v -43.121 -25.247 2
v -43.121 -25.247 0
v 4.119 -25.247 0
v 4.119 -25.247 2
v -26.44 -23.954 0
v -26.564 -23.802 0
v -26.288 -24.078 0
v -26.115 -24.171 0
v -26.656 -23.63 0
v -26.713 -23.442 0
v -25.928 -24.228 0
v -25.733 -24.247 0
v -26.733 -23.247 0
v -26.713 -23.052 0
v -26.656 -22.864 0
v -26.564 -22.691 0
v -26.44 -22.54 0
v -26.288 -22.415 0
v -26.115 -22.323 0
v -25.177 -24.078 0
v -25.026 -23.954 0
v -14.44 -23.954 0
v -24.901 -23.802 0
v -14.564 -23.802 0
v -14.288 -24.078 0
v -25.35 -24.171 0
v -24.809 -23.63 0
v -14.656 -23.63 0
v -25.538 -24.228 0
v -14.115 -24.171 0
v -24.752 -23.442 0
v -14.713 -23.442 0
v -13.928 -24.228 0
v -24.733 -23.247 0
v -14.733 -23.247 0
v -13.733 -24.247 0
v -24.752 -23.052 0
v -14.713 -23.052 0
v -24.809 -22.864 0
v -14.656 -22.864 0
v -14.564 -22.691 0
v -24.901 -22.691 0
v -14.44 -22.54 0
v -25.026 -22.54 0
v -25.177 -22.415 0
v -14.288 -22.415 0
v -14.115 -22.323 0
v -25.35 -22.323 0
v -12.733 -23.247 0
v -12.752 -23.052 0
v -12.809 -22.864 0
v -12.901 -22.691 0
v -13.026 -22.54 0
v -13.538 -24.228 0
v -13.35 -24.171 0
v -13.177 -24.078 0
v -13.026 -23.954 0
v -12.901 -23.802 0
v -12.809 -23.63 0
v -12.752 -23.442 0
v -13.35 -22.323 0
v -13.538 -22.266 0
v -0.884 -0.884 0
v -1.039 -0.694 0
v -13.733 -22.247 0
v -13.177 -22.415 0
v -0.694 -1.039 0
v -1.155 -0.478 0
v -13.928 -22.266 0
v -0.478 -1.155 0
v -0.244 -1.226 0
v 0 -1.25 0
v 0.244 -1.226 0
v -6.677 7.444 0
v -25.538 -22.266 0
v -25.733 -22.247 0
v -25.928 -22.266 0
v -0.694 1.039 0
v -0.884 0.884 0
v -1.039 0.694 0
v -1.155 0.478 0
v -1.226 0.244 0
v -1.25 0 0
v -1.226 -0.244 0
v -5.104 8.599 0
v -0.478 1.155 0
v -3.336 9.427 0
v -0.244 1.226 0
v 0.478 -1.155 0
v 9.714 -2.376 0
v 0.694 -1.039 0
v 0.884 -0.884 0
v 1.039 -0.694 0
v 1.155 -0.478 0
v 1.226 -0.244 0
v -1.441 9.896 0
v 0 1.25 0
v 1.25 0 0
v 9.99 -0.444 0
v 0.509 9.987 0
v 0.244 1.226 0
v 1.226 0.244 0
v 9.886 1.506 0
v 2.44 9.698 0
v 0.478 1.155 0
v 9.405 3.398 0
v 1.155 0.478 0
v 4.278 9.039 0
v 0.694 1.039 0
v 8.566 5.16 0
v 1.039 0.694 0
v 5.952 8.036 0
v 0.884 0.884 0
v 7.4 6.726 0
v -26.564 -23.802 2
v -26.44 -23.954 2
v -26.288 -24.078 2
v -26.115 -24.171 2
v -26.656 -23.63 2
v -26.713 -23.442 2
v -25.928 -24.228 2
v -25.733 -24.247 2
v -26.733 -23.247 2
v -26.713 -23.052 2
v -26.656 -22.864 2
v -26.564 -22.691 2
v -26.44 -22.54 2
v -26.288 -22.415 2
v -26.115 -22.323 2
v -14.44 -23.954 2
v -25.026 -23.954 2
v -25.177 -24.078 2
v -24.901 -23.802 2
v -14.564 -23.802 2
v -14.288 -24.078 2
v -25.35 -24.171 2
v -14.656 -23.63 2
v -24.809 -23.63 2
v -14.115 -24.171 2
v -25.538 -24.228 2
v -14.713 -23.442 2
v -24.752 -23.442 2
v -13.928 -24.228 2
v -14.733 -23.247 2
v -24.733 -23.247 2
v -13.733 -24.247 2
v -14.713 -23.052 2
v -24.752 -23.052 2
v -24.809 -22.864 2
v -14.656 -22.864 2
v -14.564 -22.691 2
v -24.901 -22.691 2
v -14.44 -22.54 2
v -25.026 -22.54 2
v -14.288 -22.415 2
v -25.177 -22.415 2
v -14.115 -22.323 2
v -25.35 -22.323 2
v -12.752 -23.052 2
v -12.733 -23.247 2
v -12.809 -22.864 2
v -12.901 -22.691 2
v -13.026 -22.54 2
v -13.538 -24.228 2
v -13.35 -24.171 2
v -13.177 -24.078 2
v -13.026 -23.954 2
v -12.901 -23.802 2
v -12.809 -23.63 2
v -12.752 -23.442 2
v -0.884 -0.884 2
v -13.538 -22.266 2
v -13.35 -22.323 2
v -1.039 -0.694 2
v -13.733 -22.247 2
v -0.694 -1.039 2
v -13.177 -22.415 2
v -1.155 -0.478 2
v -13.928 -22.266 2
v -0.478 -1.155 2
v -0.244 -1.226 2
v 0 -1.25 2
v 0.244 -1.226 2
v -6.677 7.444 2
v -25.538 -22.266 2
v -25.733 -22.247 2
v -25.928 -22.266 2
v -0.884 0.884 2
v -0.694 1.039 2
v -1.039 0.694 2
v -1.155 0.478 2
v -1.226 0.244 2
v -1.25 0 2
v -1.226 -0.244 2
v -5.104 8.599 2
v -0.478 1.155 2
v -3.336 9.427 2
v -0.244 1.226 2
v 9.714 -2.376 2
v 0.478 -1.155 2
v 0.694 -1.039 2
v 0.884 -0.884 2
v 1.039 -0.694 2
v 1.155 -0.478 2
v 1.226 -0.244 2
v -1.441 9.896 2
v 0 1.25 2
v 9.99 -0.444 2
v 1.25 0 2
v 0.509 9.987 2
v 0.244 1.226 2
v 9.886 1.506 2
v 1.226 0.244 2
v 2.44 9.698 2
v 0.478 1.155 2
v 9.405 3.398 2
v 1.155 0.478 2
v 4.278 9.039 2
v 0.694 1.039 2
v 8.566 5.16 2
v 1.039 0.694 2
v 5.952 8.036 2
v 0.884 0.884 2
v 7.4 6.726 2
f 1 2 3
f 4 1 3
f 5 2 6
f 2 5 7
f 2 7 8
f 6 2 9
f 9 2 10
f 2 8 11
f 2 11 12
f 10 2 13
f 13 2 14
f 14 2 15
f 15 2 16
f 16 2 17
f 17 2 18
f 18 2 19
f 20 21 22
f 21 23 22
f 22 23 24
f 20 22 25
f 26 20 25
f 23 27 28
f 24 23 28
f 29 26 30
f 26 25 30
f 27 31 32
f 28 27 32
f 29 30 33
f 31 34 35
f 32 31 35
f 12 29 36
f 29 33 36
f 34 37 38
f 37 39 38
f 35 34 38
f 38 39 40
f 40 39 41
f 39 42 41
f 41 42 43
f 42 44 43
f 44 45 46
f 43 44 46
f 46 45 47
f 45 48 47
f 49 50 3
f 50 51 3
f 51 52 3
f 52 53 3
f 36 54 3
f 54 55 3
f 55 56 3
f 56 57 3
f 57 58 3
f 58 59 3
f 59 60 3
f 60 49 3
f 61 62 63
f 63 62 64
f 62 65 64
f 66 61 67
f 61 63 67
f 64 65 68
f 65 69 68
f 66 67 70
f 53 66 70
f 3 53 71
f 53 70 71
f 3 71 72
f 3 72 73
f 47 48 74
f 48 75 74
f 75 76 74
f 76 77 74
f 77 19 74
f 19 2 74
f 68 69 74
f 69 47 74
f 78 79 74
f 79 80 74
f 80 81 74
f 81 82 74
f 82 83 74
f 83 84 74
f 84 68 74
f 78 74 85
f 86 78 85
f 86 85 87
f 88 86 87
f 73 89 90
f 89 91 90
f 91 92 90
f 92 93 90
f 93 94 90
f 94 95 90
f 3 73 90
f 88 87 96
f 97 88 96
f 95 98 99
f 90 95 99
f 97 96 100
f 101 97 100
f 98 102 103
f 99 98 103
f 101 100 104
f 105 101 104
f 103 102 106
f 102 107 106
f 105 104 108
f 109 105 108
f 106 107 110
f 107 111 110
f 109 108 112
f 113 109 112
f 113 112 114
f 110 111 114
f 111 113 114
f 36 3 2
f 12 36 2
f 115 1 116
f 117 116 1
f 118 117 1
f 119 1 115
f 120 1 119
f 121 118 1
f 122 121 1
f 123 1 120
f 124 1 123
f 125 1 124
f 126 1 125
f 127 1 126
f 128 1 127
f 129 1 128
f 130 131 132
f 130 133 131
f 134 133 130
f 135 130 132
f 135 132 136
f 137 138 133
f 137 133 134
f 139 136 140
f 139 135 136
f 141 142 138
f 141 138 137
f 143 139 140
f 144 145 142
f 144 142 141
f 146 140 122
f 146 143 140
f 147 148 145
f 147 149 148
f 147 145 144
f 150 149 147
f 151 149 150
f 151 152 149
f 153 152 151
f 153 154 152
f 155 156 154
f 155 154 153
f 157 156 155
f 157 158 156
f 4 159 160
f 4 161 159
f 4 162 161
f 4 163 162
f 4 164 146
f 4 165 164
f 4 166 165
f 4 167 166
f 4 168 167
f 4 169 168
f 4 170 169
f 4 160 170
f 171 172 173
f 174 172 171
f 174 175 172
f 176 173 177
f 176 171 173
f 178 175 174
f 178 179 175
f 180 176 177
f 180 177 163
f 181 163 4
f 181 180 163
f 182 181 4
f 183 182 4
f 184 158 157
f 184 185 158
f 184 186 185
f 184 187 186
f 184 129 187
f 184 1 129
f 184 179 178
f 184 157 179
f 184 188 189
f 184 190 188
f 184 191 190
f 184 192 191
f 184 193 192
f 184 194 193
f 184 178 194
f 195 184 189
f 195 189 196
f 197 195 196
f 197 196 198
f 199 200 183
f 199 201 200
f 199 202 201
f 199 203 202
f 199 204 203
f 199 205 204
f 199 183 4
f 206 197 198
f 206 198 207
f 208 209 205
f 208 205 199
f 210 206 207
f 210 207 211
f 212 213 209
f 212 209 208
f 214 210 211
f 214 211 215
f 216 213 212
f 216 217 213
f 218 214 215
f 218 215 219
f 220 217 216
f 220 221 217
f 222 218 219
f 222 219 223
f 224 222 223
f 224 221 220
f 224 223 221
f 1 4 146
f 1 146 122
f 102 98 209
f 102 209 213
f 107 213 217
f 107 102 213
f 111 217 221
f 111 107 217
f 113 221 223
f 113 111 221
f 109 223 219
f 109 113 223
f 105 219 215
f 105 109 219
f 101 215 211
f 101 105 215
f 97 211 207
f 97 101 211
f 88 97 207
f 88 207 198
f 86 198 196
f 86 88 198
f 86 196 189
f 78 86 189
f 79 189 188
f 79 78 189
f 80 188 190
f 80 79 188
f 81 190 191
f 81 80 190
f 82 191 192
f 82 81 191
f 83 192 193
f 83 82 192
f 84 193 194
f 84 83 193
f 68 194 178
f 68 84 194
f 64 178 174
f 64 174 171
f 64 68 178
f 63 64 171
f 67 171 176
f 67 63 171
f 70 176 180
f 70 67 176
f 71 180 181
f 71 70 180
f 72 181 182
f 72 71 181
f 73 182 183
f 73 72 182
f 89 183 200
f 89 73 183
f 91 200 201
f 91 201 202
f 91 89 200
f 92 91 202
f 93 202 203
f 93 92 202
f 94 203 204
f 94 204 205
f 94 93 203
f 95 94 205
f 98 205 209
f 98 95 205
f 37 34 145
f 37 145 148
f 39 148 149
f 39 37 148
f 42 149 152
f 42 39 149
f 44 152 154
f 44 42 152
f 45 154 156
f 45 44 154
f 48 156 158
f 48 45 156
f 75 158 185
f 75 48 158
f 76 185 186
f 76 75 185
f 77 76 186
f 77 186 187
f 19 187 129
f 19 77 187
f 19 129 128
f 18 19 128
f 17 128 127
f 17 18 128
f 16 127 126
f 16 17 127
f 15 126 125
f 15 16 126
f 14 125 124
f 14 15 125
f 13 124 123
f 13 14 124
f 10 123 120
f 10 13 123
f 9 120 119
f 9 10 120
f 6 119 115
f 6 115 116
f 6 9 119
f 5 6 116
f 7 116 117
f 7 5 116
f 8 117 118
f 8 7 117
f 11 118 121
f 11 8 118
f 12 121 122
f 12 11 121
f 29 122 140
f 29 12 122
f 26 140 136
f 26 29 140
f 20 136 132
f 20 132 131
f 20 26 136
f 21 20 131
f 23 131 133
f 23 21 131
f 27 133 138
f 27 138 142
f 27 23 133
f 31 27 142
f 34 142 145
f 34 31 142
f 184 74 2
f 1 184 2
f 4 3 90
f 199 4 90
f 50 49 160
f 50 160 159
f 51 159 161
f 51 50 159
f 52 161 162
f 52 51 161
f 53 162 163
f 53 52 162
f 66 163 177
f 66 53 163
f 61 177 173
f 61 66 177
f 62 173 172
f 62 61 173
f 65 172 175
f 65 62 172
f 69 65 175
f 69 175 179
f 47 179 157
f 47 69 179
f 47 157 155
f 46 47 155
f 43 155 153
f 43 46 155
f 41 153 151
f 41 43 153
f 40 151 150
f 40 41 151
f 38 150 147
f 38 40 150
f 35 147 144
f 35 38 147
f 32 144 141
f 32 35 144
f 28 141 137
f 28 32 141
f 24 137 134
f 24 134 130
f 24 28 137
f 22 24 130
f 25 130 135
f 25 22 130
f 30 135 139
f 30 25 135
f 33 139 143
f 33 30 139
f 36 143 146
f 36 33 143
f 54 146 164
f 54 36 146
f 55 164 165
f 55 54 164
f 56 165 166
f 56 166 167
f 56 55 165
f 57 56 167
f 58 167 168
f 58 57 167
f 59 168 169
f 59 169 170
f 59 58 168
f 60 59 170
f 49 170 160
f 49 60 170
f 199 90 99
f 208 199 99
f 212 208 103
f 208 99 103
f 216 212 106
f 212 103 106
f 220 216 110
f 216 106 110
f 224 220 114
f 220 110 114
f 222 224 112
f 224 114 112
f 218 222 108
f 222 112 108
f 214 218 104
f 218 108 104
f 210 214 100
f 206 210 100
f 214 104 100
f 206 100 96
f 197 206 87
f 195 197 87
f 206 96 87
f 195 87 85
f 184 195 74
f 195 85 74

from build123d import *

# Parameters (mm, degrees)
SKETCH_1_R      = 1.25
SKETCH_1_R_2    = 1
EXTRUDE_1_DEPTH = 2


with BuildPart() as part:
    # 草圖1 → 填料-伸長1 (new body)
    with BuildSketch(Plane.XY):
        with BuildLine():
            Line((-41.078680873, -25.246867961), (3.125001345, -25.246867961))
            Line((3.125001345, -25.246867961), (4.118524153, -25.246867961))
            Line((4.118524153, -25.246867961), (9.71355395, -2.376314303))
            ThreePointArc((9.71355395, -2.376314303), (5.139430957, 8.578242795), (-6.677431122, 7.443917894))
            Line((-6.677431122, 7.443917894), (-43.120716176, -25.246867961))
            Line((-43.120716176, -25.246867961), (-41.078680873, -25.246867961))
        make_face()
        Circle(SKETCH_1_R, mode=Mode.SUBTRACT)
        with Locations((-25.732609449, -23.246867961)):
            Circle(SKETCH_1_R_2, mode=Mode.SUBTRACT)
        with Locations((-13.732609449, -23.246867961)):
            Circle(SKETCH_1_R_2, mode=Mode.SUBTRACT)
    extrude(amount=EXTRUDE_1_DEPTH)


solid = part.part
